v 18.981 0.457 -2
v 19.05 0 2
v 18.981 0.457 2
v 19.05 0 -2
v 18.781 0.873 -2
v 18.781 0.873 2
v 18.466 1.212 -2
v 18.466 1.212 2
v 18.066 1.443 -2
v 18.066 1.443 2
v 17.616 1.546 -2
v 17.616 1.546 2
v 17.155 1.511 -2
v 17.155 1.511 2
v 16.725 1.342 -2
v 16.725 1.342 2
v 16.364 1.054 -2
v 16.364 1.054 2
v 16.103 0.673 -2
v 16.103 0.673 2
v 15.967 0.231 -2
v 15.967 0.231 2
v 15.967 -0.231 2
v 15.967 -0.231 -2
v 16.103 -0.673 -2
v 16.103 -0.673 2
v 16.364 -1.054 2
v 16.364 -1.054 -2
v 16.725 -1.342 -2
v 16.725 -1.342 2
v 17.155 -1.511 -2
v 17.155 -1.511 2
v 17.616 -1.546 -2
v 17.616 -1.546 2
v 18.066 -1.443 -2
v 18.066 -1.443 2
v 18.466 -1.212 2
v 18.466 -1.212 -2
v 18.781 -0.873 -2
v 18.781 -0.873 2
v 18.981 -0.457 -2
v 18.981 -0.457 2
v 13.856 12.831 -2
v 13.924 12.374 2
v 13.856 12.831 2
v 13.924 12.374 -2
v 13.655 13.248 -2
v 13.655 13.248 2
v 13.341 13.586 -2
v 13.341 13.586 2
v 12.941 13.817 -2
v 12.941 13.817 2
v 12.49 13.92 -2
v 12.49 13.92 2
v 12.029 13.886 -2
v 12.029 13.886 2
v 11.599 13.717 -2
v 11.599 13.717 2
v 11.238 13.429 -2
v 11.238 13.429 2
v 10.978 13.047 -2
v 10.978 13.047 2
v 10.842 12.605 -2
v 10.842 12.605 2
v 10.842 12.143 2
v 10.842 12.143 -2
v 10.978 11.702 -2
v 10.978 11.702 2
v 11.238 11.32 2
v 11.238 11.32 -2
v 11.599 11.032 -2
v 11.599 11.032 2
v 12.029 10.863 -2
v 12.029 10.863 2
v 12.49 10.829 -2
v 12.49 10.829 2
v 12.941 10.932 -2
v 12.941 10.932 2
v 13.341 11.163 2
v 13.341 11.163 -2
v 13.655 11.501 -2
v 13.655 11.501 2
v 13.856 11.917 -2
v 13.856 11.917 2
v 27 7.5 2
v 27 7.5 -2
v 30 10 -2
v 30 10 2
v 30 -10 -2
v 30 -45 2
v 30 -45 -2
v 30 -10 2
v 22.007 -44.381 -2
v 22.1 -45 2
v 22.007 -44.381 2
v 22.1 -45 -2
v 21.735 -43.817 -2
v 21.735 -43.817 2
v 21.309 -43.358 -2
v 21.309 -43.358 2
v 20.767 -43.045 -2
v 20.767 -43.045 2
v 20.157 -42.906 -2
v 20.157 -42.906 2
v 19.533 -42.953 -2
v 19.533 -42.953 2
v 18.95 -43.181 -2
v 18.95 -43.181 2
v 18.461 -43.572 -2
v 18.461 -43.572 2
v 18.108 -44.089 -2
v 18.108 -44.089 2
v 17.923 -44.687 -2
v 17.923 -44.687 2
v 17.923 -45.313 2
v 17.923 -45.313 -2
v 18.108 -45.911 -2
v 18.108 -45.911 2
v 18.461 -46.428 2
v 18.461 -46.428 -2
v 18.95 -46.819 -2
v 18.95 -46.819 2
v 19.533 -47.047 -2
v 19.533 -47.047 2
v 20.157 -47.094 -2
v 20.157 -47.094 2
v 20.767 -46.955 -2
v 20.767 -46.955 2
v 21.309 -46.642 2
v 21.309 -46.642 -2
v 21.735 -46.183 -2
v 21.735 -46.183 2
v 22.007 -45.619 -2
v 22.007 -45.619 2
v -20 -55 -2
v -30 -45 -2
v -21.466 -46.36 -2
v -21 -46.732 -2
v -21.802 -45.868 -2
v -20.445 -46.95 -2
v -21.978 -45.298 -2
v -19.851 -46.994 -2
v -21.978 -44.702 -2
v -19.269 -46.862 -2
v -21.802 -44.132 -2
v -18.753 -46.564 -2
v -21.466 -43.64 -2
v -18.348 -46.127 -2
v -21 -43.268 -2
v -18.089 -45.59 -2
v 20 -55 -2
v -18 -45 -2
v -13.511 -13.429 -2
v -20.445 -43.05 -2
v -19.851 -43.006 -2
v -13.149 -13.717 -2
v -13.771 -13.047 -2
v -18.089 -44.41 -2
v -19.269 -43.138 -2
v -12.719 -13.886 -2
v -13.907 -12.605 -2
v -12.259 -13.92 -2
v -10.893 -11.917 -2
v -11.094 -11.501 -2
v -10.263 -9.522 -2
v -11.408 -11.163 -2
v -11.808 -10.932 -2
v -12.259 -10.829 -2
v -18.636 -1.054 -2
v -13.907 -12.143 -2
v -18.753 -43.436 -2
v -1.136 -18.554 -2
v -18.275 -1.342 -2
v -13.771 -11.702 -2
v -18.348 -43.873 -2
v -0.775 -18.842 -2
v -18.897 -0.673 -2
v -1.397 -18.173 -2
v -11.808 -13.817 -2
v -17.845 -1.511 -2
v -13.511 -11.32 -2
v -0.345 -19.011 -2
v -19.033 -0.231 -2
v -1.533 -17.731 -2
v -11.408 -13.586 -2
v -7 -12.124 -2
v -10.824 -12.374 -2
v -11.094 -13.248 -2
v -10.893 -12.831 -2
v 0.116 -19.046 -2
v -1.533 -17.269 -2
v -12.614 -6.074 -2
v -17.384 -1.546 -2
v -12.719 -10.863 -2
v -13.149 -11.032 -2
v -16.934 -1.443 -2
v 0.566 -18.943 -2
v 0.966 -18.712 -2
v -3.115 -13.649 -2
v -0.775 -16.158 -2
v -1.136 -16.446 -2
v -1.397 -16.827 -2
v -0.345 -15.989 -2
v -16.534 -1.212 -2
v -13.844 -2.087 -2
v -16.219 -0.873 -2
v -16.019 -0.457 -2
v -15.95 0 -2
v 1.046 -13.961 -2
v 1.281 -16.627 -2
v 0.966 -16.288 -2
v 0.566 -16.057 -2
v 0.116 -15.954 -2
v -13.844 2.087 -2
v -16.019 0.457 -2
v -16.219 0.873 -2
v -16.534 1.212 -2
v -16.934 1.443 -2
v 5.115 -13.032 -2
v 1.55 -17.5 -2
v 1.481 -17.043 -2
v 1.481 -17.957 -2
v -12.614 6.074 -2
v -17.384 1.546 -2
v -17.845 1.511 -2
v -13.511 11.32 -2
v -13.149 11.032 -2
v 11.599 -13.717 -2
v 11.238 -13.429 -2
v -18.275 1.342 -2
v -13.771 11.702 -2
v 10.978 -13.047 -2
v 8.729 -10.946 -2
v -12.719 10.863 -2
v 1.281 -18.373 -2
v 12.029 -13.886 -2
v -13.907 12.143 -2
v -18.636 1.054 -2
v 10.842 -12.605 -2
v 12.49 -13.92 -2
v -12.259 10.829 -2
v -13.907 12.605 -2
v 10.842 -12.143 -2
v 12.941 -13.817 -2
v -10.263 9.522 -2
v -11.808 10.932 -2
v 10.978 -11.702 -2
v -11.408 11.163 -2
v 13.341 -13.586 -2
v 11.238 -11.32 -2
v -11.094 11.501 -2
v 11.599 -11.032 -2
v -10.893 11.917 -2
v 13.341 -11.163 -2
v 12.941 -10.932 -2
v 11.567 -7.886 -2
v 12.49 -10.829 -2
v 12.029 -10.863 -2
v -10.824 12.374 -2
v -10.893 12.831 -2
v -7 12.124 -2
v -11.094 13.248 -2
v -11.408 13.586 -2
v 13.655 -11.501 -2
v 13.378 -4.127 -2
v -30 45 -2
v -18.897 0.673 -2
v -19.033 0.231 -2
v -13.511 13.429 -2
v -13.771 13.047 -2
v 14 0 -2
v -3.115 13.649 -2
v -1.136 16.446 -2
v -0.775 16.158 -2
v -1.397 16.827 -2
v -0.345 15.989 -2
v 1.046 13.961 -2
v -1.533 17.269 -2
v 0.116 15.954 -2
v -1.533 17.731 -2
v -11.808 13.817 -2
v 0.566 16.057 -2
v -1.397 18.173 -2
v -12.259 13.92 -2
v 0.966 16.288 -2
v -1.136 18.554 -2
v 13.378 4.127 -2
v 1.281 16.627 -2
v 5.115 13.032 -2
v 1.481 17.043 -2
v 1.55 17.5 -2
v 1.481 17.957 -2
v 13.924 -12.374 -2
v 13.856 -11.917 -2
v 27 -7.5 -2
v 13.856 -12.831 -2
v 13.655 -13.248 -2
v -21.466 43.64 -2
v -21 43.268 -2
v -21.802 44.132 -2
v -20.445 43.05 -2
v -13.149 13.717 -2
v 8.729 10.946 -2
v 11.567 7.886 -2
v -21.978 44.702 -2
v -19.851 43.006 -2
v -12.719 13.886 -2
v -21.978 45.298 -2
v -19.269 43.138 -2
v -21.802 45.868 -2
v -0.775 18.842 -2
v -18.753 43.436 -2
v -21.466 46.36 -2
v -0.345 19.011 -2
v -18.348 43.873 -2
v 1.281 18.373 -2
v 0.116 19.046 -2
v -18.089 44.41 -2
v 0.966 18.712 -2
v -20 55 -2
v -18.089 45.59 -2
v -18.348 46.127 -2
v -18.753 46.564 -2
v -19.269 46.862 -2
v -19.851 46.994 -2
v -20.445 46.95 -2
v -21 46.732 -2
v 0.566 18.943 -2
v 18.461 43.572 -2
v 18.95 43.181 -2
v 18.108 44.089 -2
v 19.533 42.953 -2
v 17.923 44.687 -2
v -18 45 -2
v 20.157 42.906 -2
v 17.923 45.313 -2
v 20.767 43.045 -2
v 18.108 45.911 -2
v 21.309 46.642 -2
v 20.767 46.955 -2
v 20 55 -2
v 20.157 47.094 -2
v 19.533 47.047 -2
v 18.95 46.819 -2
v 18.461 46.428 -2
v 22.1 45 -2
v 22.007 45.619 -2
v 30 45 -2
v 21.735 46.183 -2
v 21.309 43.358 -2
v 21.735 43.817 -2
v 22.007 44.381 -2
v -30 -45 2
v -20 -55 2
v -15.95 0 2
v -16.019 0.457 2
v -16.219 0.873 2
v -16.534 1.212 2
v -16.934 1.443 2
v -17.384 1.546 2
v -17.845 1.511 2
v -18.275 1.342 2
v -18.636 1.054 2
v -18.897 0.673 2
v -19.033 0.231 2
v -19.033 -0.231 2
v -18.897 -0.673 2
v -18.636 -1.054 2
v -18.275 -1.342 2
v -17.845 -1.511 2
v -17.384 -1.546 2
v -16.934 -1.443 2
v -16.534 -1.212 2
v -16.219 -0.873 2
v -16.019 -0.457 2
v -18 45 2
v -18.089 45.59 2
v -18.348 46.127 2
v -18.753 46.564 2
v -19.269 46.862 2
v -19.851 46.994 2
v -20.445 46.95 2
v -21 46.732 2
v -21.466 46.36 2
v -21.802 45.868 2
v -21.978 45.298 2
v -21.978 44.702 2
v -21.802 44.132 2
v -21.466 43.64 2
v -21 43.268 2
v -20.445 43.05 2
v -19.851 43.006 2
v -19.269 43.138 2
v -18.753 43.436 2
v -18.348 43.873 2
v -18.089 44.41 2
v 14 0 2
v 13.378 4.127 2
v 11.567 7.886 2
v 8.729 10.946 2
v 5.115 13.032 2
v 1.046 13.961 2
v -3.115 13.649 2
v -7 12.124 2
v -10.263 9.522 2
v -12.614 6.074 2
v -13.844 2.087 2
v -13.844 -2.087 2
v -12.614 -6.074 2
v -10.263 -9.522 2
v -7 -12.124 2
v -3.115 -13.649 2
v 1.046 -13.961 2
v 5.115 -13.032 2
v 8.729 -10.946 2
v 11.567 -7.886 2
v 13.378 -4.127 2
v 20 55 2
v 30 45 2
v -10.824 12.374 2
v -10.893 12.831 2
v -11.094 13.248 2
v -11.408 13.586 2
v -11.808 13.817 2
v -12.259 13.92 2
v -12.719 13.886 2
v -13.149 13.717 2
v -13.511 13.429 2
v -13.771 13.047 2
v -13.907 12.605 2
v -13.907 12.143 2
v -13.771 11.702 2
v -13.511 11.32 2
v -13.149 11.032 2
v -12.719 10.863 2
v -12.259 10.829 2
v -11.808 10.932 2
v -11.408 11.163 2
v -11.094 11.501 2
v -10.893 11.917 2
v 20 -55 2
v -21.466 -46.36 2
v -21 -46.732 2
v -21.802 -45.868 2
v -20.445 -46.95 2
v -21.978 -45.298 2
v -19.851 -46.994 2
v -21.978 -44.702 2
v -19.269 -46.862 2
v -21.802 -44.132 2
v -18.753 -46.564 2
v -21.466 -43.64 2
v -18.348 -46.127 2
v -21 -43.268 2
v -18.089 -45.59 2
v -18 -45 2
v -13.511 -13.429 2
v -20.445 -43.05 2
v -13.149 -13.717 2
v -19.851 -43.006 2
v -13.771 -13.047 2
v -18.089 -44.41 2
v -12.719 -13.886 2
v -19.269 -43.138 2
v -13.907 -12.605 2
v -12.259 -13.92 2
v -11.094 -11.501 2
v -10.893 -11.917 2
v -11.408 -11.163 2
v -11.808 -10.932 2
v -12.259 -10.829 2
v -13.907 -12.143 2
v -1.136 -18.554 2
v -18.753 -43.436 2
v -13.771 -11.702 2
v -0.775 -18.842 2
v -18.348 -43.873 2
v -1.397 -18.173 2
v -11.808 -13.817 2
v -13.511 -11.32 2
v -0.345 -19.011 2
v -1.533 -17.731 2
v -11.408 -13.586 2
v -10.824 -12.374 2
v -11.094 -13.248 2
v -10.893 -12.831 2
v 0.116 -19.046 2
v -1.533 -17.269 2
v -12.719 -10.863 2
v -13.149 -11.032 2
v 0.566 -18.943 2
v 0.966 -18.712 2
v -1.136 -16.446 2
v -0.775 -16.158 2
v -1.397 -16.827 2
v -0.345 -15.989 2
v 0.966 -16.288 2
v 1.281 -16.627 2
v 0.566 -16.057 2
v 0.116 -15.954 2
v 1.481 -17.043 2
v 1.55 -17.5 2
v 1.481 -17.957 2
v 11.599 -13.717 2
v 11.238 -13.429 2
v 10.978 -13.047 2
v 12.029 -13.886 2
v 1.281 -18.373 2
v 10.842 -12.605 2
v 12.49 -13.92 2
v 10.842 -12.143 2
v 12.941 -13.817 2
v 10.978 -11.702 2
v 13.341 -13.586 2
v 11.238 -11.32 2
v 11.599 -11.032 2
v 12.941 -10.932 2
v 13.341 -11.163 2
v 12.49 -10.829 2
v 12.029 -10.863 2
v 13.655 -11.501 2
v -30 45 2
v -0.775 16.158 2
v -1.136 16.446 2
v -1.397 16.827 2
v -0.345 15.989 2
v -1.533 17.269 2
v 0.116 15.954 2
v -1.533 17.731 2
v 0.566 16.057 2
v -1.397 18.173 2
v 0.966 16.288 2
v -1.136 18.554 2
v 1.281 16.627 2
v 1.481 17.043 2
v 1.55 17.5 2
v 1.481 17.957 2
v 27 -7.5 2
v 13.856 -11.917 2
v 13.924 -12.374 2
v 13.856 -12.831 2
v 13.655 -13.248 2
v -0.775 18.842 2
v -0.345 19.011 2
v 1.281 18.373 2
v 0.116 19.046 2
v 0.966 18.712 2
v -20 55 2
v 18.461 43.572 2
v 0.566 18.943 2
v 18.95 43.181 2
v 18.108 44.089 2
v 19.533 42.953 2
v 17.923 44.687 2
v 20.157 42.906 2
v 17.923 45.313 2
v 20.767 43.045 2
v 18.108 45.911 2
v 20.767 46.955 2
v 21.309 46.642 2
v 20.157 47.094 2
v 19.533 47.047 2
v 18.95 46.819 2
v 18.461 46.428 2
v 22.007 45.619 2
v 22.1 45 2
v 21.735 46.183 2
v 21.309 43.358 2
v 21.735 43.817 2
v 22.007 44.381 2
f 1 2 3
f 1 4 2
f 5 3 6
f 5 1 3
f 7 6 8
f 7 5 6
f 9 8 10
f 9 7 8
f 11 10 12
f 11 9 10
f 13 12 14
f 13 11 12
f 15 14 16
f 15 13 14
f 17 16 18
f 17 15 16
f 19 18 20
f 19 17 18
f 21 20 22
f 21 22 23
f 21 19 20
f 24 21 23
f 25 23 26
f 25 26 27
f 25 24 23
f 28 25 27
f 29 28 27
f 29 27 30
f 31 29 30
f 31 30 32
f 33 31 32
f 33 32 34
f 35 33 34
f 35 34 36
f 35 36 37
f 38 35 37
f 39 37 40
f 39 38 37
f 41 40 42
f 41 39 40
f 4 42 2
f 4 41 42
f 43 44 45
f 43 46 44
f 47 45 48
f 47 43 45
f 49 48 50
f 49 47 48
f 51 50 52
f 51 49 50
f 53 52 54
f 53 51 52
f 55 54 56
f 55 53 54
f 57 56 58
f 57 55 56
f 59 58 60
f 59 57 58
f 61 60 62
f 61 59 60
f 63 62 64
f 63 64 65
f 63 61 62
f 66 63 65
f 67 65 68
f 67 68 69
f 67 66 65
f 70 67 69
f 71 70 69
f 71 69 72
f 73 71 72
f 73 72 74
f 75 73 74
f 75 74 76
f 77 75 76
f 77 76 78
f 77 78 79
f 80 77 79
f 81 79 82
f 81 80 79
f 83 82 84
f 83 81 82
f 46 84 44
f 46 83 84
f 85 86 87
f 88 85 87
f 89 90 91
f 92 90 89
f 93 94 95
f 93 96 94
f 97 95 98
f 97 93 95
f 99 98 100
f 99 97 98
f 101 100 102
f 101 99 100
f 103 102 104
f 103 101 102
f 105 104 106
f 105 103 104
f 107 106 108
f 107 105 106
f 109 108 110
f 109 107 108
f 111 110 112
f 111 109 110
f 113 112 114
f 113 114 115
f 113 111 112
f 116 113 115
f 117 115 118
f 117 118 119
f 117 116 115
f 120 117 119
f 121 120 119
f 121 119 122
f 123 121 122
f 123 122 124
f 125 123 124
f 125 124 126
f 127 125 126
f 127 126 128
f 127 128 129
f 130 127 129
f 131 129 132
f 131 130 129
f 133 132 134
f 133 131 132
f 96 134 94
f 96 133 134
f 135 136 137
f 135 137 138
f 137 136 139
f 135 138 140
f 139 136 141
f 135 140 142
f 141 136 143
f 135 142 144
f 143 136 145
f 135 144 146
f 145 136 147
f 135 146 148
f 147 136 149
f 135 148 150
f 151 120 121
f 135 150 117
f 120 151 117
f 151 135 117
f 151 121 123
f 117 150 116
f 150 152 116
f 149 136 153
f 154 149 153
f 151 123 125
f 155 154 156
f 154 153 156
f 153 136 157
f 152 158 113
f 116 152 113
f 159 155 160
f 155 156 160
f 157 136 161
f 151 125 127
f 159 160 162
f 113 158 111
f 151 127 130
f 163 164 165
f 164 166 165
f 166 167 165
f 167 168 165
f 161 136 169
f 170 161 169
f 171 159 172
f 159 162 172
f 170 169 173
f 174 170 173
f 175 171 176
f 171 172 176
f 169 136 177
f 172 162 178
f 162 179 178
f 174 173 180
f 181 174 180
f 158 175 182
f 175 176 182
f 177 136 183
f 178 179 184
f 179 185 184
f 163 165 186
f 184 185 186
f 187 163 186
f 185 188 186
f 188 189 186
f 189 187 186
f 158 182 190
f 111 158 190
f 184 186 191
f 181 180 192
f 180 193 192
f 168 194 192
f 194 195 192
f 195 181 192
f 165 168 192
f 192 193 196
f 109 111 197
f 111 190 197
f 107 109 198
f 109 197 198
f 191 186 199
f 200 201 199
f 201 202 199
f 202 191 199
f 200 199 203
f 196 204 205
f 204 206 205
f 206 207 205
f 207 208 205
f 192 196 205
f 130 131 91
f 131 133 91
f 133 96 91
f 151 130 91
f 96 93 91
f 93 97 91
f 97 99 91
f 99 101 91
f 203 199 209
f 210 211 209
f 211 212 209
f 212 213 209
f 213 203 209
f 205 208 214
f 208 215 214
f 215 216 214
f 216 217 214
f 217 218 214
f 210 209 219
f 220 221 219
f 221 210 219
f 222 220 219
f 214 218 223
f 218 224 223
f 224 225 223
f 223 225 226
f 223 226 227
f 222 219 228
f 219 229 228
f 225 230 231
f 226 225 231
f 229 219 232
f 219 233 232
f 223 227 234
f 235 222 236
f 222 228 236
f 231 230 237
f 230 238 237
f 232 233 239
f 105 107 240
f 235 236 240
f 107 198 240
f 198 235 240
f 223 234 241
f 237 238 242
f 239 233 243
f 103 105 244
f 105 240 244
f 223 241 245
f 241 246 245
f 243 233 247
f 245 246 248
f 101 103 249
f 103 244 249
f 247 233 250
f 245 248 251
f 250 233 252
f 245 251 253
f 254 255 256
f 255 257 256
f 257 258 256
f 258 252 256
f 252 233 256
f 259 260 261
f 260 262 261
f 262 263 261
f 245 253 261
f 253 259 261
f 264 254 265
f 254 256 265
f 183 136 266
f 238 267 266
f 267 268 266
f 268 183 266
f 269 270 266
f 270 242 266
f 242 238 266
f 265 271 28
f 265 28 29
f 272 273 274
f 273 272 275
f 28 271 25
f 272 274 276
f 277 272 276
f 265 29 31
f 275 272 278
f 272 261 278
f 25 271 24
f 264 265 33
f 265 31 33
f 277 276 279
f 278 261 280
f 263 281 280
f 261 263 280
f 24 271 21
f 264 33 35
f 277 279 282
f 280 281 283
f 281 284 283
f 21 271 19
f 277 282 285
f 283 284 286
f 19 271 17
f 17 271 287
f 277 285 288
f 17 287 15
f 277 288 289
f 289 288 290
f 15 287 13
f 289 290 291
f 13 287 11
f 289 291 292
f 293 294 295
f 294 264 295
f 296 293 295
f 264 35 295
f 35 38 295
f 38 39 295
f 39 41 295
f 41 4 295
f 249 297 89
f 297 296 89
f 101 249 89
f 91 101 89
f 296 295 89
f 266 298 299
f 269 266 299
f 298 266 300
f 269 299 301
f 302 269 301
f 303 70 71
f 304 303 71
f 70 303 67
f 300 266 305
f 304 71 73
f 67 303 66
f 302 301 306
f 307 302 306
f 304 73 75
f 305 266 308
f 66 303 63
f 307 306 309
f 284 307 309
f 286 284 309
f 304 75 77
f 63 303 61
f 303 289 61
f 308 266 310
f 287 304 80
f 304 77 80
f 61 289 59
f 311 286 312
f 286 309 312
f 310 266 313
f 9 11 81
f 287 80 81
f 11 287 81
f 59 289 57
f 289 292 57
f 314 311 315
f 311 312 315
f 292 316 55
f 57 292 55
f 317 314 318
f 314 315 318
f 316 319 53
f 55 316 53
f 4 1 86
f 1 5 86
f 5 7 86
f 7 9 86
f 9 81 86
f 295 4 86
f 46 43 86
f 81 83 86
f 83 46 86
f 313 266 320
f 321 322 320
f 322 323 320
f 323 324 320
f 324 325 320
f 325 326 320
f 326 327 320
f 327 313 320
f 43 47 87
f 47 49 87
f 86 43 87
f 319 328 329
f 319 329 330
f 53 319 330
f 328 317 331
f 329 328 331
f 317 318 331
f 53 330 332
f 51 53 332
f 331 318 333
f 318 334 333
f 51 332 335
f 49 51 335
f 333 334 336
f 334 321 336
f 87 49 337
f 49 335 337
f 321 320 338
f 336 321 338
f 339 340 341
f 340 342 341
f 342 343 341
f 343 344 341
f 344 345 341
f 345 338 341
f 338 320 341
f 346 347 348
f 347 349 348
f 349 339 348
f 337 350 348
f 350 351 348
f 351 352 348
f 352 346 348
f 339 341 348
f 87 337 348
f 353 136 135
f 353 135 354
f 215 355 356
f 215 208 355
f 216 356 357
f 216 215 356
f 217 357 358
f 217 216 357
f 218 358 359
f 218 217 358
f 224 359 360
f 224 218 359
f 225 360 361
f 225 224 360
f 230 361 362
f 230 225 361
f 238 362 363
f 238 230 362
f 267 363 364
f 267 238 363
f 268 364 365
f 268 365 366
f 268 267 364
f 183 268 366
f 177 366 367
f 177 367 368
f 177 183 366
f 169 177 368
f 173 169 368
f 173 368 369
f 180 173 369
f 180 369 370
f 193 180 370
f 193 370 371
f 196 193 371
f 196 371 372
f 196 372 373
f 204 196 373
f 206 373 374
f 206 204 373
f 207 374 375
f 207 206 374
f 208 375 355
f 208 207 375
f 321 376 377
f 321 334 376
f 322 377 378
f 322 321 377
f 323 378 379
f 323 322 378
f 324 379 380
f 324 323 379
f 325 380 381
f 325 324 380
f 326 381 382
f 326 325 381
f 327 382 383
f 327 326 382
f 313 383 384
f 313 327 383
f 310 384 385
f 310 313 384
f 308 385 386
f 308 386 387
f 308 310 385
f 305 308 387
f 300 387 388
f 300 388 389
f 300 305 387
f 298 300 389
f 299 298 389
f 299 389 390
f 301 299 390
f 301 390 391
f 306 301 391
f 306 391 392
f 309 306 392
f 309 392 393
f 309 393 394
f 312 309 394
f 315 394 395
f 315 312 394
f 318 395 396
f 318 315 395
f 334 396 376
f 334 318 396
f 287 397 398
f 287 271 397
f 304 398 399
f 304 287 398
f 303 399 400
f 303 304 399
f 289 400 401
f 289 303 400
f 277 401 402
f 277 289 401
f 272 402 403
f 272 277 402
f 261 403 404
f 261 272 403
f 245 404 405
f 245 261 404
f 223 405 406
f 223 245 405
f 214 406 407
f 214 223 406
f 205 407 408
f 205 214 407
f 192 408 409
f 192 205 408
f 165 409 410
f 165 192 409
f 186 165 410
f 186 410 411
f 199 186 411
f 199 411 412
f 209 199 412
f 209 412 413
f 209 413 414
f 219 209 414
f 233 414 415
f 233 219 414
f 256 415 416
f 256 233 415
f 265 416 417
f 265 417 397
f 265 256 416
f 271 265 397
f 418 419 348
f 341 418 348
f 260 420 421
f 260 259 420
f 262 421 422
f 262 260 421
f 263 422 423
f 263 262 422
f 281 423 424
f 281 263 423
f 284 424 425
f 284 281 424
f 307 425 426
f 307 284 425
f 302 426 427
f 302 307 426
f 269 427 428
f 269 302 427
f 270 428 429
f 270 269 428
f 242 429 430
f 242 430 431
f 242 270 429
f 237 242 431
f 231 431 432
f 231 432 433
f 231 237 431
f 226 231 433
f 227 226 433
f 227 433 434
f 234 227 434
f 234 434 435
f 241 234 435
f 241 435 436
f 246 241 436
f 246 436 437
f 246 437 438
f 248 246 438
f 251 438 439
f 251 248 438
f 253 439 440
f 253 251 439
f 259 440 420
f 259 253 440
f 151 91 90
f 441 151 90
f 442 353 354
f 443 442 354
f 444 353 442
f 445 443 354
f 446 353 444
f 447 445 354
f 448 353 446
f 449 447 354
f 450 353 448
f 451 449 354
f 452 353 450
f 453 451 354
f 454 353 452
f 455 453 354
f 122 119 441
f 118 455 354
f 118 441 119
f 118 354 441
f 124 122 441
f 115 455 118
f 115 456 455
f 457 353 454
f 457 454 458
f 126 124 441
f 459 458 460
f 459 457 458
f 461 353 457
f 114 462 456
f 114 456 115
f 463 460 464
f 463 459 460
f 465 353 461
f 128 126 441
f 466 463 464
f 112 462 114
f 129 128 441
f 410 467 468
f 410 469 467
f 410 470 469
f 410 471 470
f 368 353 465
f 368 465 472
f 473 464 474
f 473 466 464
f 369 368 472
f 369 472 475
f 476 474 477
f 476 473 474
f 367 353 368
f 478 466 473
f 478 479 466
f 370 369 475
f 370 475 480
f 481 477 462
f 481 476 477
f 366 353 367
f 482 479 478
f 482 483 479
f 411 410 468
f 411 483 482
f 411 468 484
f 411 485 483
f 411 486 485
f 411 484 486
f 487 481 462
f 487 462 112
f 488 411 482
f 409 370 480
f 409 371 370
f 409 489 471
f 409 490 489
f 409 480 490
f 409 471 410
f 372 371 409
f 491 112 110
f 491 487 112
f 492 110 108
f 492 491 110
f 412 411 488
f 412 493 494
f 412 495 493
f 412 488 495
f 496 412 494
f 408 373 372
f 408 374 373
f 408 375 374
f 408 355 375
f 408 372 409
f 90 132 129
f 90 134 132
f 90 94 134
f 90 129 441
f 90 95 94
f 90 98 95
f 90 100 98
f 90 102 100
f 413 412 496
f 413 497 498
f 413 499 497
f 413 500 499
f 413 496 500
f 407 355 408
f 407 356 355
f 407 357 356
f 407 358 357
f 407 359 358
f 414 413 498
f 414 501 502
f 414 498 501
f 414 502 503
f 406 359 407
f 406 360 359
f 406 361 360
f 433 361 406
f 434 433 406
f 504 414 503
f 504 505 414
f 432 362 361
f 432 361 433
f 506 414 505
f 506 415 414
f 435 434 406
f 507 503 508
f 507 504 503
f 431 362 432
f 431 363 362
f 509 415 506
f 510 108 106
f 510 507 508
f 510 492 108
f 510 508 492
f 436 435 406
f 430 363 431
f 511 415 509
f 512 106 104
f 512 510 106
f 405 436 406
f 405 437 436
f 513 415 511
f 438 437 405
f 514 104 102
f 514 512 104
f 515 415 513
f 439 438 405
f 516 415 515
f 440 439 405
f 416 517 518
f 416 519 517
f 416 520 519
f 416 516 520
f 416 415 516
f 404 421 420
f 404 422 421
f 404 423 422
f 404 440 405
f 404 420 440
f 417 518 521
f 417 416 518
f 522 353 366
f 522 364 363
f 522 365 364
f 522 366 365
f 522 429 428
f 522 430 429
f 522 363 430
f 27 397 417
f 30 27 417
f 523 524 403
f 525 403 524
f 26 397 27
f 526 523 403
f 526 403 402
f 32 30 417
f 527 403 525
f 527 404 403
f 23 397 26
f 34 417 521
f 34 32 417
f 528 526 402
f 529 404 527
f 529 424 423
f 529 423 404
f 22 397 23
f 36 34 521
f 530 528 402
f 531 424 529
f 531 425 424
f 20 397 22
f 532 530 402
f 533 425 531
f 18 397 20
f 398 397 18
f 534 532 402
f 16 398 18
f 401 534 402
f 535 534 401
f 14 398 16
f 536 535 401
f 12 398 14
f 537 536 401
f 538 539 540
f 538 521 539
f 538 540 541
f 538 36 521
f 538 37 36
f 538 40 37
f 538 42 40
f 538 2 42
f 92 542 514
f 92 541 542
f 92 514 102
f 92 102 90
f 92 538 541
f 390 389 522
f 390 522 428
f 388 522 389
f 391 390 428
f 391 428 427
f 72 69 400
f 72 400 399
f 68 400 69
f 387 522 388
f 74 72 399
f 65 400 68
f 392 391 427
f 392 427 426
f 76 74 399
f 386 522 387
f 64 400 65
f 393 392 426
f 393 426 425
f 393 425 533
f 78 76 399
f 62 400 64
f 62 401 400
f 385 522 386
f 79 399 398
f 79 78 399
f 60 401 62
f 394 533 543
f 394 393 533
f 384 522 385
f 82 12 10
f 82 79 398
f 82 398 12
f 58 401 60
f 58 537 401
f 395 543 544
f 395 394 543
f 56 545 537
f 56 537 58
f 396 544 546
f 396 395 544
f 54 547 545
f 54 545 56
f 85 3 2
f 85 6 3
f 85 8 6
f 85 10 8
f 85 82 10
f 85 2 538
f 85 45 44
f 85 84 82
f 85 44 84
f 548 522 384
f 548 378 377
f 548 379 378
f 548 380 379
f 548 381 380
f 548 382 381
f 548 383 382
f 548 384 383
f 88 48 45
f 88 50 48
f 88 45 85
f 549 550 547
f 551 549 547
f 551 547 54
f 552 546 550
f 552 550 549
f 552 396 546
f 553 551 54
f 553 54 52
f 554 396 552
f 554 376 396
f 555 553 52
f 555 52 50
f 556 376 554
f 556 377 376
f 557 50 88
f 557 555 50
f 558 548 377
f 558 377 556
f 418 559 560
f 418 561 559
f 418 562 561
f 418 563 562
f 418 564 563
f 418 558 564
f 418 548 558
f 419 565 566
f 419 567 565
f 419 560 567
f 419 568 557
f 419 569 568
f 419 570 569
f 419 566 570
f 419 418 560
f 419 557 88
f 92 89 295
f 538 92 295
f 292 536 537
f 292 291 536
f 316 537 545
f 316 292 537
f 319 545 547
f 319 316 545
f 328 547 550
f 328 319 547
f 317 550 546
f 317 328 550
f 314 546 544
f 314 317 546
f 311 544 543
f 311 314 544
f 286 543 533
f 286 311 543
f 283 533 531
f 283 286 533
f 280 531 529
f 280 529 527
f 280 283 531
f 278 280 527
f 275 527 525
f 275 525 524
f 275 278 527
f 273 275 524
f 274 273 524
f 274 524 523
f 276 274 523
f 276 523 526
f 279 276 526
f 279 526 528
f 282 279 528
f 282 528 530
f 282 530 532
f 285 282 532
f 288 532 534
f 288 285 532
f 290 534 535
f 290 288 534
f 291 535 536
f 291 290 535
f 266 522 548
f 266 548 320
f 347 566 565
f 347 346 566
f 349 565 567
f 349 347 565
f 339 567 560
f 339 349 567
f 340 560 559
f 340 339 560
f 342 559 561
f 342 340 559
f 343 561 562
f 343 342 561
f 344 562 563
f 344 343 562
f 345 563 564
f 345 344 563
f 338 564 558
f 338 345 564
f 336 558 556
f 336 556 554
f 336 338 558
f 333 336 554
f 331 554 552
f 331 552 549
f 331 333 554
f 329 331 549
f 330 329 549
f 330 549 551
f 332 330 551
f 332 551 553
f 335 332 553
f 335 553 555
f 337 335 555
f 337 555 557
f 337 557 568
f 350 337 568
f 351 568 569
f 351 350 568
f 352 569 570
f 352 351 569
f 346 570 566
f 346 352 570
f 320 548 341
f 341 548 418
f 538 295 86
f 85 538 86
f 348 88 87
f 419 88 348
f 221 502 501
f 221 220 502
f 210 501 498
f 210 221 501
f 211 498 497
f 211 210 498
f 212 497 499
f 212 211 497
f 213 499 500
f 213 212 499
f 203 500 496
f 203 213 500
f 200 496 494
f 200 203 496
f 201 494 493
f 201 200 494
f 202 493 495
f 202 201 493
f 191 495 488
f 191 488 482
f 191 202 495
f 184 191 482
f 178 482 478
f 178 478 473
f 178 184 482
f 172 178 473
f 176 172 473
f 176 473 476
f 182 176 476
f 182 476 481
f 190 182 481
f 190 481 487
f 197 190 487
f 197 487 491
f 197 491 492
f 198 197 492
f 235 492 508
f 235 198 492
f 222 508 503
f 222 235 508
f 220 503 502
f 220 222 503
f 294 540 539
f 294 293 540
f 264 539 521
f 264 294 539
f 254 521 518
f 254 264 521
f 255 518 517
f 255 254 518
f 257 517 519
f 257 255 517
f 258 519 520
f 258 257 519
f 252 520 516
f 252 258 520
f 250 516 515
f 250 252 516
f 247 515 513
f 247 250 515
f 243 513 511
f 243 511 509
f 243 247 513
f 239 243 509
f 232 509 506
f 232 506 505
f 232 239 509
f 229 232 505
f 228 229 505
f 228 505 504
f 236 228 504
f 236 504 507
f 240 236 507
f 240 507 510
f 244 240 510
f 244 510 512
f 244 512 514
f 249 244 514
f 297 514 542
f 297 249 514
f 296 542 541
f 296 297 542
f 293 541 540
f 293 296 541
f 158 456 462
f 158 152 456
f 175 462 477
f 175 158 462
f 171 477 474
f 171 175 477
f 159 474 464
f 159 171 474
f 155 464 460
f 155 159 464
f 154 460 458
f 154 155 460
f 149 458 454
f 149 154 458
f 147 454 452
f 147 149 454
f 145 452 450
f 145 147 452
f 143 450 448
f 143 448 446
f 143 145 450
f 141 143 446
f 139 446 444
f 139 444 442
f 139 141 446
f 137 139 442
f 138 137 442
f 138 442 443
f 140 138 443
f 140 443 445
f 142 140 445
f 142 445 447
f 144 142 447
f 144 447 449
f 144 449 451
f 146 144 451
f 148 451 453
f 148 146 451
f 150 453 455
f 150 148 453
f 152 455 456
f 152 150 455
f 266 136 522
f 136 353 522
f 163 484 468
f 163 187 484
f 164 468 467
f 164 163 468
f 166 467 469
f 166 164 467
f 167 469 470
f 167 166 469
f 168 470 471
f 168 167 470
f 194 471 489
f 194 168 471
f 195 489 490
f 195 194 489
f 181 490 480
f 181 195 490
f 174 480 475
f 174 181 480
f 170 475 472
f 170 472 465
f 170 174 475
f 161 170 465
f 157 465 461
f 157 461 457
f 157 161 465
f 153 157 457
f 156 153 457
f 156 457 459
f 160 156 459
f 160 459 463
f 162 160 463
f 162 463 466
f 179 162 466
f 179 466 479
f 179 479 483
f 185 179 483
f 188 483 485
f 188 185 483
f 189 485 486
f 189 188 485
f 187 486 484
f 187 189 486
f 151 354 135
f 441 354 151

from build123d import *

# Parameters (mm, degrees)
SKETCH_1_W          = 60
SKETCH_1_H          = 110
SKETCH_1_R          = 14
SKETCH_1_R_2        = 2
SKETCH_1_R_3        = 2.1
SKETCH_1_R_4        = 1.55
EXTRUDE_1_DEPTH     = 2
CHAMFER_1_SIZE      = 10
CUT_EXTRUDE_1_DEPTH = 63.777384463


with BuildPart() as part:
    # 草图1 → 凸台-拉伸1 (new, symmetric)
    with BuildSketch(Plane.XY):
        Rectangle(SKETCH_1_W, SKETCH_1_H)
        Circle(SKETCH_1_R, mode=Mode.SUBTRACT)
        with Locations((-20, 45)):
            Circle(SKETCH_1_R_2, mode=Mode.SUBTRACT)
        with Locations((20, 45)):
            Circle(SKETCH_1_R_3, mode=Mode.SUBTRACT)
        with Locations((-20, -45)):
            Circle(SKETCH_1_R_2, mode=Mode.SUBTRACT)
        with Locations((20, -45)):
            Circle(SKETCH_1_R_3, mode=Mode.SUBTRACT)
        with Locations((0, 17.5)):
            Circle(SKETCH_1_R_4, mode=Mode.SUBTRACT)
        with Locations((12.374368671, 12.374368671)):
            Circle(SKETCH_1_R_4, mode=Mode.SUBTRACT)
        with Locations((17.5, 0)):
            Circle(SKETCH_1_R_4, mode=Mode.SUBTRACT)
        with Locations((12.374368671, -12.374368671)):
            Circle(SKETCH_1_R_4, mode=Mode.SUBTRACT)
        with Locations((0, -17.5)):
            Circle(SKETCH_1_R_4, mode=Mode.SUBTRACT)
        with Locations((-12.374368671, -12.374368671)):
            Circle(SKETCH_1_R_4, mode=Mode.SUBTRACT)
        with Locations((-17.5, 0)):
            Circle(SKETCH_1_R_4, mode=Mode.SUBTRACT)
        with Locations((-12.374368671, 12.374368671)):
            Circle(SKETCH_1_R_4, mode=Mode.SUBTRACT)
    extrude(amount=EXTRUDE_1_DEPTH, both=True)

    # 倒角1
    chamfer_1_edges = [part.edges().sort_by_distance(p)[0] for p in [
        (-30, 55, 0),
        (30, 55, 0),
        (30, -55, 0),
        (-30, -55, 0),
    ]]
    chamfer(chamfer_1_edges, length=CHAMFER_1_SIZE)

    # 草图2 → 切除-拉伸1 (cut, through all)
    with BuildSketch(Plane(origin=(0, 0, -2), x_dir=(-1, 0, 0), z_dir=(0, 0, -1))):
        Polygon((-30, -10), (-27, -7.5), (-27, 7.5), (-30, 10), align=None)
    extrude(amount=-CUT_EXTRUDE_1_DEPTH, mode=Mode.SUBTRACT)


solid = part.part
